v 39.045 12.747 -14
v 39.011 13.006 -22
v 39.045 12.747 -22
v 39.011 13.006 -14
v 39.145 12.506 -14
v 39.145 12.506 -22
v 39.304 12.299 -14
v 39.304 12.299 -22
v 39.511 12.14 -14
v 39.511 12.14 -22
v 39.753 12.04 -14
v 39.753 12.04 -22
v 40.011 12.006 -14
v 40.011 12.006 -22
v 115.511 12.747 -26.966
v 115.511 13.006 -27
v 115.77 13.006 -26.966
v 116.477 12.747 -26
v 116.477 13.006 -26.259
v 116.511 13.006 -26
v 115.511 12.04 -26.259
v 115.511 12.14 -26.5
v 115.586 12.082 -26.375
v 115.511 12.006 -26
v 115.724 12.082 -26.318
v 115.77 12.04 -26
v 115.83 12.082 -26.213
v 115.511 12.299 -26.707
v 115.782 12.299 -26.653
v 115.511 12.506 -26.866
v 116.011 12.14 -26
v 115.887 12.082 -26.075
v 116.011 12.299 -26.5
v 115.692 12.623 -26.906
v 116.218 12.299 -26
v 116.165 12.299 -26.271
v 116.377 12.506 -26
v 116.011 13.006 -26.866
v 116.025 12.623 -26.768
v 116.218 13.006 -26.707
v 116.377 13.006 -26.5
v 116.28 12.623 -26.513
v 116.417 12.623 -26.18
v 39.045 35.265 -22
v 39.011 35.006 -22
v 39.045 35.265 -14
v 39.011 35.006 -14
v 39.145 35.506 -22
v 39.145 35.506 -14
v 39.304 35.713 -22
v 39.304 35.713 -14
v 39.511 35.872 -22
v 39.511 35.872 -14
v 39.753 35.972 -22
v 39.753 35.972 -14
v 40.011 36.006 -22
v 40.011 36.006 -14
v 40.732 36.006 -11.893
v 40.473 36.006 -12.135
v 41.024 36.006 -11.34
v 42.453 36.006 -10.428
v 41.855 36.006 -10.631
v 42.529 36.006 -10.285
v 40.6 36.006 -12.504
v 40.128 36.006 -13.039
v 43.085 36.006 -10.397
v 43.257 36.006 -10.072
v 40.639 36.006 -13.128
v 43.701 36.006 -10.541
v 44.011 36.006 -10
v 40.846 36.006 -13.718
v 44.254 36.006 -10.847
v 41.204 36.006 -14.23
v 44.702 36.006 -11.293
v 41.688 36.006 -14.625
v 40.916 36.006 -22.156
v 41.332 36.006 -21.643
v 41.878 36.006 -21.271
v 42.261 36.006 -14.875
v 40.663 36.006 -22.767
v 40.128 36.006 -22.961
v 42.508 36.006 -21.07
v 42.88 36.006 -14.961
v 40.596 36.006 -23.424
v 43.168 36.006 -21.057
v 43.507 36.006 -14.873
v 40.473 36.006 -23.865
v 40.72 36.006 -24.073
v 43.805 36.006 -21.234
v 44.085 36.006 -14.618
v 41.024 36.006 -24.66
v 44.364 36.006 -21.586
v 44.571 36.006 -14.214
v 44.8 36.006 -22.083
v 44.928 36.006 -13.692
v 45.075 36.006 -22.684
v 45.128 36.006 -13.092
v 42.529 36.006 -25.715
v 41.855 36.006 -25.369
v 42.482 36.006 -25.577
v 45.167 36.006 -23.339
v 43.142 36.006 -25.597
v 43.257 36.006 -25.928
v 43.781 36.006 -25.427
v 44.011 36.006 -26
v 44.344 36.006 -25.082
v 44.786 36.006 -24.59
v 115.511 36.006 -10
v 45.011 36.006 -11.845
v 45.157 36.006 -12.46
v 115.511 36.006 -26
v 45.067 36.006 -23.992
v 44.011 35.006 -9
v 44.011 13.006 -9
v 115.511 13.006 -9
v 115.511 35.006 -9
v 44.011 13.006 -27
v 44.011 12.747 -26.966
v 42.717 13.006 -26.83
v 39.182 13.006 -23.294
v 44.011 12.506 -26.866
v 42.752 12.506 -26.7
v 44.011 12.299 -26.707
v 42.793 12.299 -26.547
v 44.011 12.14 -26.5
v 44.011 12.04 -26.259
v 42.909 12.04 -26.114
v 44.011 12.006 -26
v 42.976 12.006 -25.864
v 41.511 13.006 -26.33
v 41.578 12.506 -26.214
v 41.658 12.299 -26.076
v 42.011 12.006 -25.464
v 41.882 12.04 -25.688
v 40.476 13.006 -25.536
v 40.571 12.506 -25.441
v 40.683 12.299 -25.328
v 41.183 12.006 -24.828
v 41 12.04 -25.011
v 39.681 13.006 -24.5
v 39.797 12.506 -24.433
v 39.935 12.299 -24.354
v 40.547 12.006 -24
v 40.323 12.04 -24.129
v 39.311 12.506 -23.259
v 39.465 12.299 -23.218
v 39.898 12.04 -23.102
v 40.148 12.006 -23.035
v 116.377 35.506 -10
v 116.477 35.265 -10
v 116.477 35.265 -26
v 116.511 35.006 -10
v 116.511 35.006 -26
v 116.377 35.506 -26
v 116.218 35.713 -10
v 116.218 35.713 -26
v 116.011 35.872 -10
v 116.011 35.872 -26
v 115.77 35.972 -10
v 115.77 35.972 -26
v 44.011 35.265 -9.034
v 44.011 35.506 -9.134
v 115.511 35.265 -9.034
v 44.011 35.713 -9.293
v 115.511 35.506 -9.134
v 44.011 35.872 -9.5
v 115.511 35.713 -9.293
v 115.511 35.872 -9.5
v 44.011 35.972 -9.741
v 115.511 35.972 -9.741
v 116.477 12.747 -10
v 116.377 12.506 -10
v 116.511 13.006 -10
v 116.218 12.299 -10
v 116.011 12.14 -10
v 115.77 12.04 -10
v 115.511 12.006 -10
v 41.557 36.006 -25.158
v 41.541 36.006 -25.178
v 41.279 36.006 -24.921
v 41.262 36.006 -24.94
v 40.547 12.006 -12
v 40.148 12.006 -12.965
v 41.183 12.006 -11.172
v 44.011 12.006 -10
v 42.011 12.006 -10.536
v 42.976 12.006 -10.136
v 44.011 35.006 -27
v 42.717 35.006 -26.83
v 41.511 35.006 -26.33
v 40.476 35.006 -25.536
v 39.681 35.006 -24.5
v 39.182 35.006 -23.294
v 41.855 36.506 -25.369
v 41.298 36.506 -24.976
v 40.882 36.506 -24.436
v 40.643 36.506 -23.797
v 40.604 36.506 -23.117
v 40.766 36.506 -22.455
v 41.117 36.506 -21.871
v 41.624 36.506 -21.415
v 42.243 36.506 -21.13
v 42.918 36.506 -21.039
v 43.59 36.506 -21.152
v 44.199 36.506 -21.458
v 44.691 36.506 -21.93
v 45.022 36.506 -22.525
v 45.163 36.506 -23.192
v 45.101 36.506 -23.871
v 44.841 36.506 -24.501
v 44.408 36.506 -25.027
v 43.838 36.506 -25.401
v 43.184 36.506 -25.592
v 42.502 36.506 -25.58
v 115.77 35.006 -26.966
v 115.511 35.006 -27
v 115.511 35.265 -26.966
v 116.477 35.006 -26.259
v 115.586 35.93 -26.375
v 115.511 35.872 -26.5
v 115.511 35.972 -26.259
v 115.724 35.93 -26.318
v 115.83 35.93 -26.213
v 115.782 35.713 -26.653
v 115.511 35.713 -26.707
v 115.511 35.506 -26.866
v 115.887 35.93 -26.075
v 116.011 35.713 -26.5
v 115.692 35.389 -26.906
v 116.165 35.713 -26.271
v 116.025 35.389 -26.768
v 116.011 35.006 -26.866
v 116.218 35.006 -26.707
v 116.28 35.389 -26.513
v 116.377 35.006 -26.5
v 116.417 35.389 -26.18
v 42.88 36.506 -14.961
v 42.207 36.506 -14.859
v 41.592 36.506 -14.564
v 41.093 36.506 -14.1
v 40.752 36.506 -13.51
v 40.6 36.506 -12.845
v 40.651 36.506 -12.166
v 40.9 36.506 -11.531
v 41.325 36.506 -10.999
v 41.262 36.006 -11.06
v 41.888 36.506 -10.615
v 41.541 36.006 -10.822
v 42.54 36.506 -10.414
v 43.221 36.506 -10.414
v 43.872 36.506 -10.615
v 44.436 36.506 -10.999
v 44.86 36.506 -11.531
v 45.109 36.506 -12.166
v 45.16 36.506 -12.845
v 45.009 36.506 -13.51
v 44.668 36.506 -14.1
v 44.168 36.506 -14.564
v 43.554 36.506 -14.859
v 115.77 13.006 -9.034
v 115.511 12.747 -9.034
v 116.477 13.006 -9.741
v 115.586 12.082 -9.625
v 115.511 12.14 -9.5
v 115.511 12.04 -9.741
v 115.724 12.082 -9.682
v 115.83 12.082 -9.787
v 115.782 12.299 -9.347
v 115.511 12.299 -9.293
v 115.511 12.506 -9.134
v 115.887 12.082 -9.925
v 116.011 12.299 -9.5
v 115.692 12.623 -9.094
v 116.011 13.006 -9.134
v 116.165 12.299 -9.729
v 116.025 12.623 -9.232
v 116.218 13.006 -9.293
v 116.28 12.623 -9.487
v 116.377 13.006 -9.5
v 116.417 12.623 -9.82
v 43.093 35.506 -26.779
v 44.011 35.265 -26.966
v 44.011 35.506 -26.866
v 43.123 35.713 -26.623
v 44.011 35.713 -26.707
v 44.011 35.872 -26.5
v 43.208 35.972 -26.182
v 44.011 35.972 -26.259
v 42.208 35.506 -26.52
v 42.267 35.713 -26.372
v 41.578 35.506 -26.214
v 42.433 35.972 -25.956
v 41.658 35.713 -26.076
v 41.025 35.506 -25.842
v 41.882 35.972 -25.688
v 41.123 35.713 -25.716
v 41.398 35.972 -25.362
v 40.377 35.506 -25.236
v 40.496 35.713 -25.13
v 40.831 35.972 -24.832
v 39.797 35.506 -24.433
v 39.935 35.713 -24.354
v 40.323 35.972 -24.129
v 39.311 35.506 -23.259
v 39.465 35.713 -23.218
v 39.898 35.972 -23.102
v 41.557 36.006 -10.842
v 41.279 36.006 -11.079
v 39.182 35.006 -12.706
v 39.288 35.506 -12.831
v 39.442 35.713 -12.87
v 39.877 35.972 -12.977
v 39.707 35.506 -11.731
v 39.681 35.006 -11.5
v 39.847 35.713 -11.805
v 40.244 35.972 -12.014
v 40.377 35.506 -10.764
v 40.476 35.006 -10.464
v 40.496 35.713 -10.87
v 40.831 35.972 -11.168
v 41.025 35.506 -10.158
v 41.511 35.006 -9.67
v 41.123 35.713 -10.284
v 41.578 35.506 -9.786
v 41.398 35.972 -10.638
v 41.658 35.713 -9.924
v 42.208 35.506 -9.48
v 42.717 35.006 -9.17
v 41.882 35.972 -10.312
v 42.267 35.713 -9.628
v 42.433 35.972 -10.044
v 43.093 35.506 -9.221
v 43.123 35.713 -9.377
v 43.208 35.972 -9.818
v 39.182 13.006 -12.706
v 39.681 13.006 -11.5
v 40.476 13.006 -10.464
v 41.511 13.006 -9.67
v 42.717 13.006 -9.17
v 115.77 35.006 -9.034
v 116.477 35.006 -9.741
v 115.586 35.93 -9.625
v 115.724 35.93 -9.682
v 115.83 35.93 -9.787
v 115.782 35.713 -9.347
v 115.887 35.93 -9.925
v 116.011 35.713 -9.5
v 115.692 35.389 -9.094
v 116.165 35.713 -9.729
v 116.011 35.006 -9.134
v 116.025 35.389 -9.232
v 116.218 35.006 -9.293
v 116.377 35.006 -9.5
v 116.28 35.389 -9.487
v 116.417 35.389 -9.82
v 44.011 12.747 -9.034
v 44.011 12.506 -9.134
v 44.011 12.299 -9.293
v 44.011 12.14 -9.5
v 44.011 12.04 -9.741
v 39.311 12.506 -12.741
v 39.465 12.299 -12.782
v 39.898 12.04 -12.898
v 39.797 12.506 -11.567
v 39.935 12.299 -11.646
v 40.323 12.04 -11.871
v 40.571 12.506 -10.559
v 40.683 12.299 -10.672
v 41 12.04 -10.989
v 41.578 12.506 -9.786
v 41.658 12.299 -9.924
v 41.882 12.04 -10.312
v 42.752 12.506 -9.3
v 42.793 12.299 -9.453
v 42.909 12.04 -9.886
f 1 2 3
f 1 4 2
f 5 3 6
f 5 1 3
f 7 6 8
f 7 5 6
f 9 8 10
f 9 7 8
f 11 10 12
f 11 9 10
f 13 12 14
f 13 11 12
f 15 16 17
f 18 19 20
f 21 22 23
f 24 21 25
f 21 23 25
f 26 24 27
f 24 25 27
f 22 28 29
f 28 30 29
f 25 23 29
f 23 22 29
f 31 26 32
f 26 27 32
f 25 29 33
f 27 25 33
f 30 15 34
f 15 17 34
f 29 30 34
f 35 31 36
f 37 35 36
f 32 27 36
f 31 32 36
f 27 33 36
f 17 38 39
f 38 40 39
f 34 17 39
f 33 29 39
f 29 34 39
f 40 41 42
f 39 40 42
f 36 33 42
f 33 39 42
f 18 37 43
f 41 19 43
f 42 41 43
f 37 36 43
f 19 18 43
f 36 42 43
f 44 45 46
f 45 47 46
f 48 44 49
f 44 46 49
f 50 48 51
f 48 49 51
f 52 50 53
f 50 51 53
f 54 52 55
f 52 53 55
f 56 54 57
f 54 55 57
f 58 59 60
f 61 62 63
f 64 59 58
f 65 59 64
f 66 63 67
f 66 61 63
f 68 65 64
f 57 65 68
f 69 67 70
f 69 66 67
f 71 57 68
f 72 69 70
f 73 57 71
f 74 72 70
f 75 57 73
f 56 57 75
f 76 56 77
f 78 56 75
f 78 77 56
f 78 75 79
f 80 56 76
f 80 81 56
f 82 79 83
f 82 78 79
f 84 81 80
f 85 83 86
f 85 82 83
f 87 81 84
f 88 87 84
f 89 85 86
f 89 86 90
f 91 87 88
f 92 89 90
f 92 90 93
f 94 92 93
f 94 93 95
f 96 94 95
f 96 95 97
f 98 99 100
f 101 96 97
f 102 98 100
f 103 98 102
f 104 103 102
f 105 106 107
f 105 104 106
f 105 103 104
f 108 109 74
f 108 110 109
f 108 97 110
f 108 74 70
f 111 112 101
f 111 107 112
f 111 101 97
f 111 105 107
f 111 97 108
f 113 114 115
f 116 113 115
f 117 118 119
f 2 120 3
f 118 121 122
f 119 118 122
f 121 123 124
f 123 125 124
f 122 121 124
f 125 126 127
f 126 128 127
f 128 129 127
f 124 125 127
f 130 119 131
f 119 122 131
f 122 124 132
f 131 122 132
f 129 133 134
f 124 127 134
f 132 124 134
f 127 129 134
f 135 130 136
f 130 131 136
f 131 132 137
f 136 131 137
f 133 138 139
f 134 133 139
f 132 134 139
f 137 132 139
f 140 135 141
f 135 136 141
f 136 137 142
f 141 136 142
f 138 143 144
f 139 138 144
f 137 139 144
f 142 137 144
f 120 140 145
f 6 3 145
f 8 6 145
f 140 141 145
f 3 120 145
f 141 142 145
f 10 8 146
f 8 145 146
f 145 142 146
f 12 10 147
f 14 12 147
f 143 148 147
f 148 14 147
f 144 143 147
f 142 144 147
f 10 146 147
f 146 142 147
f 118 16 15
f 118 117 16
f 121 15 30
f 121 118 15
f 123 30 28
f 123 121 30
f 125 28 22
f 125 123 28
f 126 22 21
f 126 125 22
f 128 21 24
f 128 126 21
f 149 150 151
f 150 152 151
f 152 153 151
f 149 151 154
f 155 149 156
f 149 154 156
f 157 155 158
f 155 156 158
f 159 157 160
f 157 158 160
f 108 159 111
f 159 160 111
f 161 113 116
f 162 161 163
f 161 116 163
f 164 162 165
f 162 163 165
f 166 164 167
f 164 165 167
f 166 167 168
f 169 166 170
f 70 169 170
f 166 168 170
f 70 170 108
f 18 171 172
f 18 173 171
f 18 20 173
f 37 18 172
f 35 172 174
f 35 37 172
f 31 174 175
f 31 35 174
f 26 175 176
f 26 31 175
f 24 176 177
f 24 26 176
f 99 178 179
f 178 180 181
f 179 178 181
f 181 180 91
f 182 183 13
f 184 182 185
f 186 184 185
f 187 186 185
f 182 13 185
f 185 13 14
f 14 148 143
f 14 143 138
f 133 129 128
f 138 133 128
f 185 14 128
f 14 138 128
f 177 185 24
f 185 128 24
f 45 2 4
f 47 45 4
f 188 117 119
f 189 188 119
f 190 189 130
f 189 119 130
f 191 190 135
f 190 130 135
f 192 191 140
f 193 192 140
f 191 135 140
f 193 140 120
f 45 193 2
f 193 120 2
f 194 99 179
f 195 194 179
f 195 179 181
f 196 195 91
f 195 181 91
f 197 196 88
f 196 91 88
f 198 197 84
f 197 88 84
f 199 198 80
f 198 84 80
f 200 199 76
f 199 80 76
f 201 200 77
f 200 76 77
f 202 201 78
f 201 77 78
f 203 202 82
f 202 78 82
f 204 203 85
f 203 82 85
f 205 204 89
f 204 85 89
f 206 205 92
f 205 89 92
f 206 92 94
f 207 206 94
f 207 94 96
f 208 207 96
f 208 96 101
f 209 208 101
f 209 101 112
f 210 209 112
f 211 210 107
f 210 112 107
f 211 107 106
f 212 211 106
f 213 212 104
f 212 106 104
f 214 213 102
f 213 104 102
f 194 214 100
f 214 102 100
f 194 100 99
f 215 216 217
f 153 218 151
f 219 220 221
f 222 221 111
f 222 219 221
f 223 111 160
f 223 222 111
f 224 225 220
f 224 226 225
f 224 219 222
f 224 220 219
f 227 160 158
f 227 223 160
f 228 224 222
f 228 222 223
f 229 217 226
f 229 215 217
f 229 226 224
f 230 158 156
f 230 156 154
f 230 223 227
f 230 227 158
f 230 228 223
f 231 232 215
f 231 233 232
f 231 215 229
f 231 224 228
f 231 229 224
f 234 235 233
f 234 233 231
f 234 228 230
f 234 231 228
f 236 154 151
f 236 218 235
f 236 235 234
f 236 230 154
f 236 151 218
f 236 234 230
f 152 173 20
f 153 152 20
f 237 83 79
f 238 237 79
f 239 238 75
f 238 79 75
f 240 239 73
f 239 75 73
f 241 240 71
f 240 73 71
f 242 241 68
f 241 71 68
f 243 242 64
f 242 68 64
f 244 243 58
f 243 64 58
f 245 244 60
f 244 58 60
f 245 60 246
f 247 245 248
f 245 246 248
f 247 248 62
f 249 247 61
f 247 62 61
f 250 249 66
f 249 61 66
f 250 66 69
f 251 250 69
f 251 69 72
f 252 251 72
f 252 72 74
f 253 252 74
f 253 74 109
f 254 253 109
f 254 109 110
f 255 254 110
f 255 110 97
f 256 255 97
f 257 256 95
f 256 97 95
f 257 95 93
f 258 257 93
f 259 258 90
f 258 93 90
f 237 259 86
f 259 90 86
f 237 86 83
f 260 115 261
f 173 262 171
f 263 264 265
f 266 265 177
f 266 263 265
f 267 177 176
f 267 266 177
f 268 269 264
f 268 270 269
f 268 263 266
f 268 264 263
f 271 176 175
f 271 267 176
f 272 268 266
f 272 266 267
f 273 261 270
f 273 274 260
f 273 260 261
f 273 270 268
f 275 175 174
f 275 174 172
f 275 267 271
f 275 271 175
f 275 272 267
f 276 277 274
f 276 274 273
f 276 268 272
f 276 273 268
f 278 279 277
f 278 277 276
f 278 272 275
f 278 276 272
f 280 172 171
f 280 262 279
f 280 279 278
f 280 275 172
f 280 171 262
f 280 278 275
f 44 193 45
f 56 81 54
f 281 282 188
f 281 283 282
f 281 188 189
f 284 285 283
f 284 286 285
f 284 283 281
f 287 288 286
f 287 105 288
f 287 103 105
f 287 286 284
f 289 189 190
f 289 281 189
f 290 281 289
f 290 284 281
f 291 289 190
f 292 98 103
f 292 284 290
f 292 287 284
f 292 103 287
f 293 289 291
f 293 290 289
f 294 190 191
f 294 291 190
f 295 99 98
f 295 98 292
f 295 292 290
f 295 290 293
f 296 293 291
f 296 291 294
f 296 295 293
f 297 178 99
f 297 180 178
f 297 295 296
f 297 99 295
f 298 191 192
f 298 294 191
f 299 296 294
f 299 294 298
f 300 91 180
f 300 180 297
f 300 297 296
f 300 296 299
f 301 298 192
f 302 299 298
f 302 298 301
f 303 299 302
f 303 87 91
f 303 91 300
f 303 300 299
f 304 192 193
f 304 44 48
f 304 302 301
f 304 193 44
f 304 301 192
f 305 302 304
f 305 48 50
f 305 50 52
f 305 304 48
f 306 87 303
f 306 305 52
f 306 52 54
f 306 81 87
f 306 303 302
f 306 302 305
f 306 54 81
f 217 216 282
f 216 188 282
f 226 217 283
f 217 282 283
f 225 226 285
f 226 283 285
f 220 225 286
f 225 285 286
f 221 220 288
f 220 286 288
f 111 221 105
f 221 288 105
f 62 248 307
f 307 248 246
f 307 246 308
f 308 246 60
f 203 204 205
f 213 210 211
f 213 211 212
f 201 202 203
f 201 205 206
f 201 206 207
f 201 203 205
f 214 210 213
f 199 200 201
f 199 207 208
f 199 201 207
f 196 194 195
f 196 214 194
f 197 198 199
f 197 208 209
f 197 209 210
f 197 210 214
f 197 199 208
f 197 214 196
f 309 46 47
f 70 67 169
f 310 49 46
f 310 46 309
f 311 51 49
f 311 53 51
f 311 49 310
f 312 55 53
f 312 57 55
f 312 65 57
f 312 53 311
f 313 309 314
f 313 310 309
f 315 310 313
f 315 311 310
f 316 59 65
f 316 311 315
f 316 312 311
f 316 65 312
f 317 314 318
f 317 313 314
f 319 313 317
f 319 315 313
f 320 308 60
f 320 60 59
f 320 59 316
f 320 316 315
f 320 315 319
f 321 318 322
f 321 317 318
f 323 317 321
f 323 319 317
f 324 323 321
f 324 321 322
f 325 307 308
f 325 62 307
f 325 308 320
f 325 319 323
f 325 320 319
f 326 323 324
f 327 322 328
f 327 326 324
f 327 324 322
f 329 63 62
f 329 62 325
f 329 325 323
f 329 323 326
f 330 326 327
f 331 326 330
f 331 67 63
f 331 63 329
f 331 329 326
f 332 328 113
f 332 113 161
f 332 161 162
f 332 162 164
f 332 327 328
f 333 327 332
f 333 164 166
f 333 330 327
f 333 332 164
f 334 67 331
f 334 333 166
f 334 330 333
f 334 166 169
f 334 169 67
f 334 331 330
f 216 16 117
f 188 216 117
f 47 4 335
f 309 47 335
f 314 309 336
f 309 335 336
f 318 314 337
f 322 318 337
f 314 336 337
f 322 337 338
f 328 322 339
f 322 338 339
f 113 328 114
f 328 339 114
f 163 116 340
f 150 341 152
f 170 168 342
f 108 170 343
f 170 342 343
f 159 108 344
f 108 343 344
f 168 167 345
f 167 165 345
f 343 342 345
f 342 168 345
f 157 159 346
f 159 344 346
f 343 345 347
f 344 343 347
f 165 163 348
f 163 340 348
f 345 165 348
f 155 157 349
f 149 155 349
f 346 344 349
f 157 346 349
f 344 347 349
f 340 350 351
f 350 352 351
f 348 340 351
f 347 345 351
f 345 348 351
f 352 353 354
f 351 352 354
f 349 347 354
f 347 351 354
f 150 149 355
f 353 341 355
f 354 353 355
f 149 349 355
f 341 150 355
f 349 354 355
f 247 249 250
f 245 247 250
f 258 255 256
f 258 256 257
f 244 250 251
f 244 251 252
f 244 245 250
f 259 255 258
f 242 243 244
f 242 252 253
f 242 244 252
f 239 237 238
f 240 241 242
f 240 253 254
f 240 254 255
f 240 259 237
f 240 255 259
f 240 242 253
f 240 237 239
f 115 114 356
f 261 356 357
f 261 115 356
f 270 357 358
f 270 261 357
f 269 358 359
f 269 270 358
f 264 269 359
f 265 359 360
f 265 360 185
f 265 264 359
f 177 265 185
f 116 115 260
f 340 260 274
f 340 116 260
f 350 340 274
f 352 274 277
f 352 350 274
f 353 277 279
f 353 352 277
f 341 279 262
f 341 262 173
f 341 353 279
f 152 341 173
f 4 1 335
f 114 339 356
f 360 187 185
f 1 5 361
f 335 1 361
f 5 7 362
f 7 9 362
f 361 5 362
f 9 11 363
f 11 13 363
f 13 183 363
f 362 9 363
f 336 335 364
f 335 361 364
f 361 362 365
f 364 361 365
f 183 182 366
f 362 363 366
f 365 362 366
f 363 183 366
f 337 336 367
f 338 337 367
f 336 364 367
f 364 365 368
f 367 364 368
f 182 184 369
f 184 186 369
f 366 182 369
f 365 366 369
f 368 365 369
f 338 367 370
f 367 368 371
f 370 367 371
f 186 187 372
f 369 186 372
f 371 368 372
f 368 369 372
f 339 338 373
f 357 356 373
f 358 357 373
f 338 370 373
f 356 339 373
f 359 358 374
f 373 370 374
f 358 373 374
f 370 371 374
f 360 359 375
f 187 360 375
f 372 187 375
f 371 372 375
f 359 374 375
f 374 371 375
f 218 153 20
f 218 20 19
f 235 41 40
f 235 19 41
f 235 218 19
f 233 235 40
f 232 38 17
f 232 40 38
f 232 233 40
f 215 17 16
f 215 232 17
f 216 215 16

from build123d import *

# Parameters (mm, degrees)
BOSS_EXTRUDE1_DEPTH = 48
FILLET1_R           = 2
SKETCH7_R           = 4.572679887
BOSS_EXTRUDE3_DEPTH = 1
L_EK1_SCALE         = 0.5


with BuildPart() as part:
    # Sketch3 → Boss-Extrude1 (new body)
    with BuildSketch(Plane(origin=(0, 0, 0), x_dir=(1, 0, 0), z_dir=(0, 1, 0))):
        with BuildLine():
            Line((10, 0), (155, 0))
            Line((155, 0), (155, 36))
            Line((155, 36), (10, 36))
            ThreePointArc((10, 36), (2.928932188, 33.071067812), (0, 26))
            Line((0, 26), (0, 10))
            ThreePointArc((0, 10), (2.928932188, 2.928932188), (10, 0))
        make_face()
    extrude(amount=BOSS_EXTRUDE1_DEPTH)

    # Fillet1
    fillet1_edges = [part.edges().sort_by_distance(p)[0] for p in [
        (155, 24, 0),
        (155, 24, -36),
        (2.928932188, 48, -33.071067812),
        (0, 48, -18),
        (2.928932188, 48, -2.928932188),
        (82.5, 48, 0),
        (155, 48, -18),
        (82.5, 0, 0),
        (2.928932188, 0, -2.928932188),
        (0, 0, -18),
        (2.928932188, 0, -33.071067812),
        (82.5, 0, -36),
        (155, 0, -18),
        (82.5, 48, -36),
    ]]
    fillet(fillet1_edges, radius=FILLET1_R)

    # Sketch7 → Boss-Extrude3 (add)
    with BuildSketch(Plane(origin=(0, 48, 0), x_dir=(1, 0, 0), z_dir=(0, 1, 0))):
        with Locations(Location((7.738139678, 28.650889337, 0), (0, 0, 116.659797152))):
            Circle(SKETCH7_R)
        with Locations(Location((7.738139678, 7.349110663, 0), (0, 0, 90))):
            Circle(SKETCH7_R)
    extrude(amount=BOSS_EXTRUDE3_DEPTH)


with BuildPart() as part_1:
    # Ölçek1: scaled about (78.022697694, 24.012137282, -18)
    add(part.part.scale(L_EK1_SCALE).moved(Location((39.011348847, 12.006068641, -9))))


solid = part_1.part
